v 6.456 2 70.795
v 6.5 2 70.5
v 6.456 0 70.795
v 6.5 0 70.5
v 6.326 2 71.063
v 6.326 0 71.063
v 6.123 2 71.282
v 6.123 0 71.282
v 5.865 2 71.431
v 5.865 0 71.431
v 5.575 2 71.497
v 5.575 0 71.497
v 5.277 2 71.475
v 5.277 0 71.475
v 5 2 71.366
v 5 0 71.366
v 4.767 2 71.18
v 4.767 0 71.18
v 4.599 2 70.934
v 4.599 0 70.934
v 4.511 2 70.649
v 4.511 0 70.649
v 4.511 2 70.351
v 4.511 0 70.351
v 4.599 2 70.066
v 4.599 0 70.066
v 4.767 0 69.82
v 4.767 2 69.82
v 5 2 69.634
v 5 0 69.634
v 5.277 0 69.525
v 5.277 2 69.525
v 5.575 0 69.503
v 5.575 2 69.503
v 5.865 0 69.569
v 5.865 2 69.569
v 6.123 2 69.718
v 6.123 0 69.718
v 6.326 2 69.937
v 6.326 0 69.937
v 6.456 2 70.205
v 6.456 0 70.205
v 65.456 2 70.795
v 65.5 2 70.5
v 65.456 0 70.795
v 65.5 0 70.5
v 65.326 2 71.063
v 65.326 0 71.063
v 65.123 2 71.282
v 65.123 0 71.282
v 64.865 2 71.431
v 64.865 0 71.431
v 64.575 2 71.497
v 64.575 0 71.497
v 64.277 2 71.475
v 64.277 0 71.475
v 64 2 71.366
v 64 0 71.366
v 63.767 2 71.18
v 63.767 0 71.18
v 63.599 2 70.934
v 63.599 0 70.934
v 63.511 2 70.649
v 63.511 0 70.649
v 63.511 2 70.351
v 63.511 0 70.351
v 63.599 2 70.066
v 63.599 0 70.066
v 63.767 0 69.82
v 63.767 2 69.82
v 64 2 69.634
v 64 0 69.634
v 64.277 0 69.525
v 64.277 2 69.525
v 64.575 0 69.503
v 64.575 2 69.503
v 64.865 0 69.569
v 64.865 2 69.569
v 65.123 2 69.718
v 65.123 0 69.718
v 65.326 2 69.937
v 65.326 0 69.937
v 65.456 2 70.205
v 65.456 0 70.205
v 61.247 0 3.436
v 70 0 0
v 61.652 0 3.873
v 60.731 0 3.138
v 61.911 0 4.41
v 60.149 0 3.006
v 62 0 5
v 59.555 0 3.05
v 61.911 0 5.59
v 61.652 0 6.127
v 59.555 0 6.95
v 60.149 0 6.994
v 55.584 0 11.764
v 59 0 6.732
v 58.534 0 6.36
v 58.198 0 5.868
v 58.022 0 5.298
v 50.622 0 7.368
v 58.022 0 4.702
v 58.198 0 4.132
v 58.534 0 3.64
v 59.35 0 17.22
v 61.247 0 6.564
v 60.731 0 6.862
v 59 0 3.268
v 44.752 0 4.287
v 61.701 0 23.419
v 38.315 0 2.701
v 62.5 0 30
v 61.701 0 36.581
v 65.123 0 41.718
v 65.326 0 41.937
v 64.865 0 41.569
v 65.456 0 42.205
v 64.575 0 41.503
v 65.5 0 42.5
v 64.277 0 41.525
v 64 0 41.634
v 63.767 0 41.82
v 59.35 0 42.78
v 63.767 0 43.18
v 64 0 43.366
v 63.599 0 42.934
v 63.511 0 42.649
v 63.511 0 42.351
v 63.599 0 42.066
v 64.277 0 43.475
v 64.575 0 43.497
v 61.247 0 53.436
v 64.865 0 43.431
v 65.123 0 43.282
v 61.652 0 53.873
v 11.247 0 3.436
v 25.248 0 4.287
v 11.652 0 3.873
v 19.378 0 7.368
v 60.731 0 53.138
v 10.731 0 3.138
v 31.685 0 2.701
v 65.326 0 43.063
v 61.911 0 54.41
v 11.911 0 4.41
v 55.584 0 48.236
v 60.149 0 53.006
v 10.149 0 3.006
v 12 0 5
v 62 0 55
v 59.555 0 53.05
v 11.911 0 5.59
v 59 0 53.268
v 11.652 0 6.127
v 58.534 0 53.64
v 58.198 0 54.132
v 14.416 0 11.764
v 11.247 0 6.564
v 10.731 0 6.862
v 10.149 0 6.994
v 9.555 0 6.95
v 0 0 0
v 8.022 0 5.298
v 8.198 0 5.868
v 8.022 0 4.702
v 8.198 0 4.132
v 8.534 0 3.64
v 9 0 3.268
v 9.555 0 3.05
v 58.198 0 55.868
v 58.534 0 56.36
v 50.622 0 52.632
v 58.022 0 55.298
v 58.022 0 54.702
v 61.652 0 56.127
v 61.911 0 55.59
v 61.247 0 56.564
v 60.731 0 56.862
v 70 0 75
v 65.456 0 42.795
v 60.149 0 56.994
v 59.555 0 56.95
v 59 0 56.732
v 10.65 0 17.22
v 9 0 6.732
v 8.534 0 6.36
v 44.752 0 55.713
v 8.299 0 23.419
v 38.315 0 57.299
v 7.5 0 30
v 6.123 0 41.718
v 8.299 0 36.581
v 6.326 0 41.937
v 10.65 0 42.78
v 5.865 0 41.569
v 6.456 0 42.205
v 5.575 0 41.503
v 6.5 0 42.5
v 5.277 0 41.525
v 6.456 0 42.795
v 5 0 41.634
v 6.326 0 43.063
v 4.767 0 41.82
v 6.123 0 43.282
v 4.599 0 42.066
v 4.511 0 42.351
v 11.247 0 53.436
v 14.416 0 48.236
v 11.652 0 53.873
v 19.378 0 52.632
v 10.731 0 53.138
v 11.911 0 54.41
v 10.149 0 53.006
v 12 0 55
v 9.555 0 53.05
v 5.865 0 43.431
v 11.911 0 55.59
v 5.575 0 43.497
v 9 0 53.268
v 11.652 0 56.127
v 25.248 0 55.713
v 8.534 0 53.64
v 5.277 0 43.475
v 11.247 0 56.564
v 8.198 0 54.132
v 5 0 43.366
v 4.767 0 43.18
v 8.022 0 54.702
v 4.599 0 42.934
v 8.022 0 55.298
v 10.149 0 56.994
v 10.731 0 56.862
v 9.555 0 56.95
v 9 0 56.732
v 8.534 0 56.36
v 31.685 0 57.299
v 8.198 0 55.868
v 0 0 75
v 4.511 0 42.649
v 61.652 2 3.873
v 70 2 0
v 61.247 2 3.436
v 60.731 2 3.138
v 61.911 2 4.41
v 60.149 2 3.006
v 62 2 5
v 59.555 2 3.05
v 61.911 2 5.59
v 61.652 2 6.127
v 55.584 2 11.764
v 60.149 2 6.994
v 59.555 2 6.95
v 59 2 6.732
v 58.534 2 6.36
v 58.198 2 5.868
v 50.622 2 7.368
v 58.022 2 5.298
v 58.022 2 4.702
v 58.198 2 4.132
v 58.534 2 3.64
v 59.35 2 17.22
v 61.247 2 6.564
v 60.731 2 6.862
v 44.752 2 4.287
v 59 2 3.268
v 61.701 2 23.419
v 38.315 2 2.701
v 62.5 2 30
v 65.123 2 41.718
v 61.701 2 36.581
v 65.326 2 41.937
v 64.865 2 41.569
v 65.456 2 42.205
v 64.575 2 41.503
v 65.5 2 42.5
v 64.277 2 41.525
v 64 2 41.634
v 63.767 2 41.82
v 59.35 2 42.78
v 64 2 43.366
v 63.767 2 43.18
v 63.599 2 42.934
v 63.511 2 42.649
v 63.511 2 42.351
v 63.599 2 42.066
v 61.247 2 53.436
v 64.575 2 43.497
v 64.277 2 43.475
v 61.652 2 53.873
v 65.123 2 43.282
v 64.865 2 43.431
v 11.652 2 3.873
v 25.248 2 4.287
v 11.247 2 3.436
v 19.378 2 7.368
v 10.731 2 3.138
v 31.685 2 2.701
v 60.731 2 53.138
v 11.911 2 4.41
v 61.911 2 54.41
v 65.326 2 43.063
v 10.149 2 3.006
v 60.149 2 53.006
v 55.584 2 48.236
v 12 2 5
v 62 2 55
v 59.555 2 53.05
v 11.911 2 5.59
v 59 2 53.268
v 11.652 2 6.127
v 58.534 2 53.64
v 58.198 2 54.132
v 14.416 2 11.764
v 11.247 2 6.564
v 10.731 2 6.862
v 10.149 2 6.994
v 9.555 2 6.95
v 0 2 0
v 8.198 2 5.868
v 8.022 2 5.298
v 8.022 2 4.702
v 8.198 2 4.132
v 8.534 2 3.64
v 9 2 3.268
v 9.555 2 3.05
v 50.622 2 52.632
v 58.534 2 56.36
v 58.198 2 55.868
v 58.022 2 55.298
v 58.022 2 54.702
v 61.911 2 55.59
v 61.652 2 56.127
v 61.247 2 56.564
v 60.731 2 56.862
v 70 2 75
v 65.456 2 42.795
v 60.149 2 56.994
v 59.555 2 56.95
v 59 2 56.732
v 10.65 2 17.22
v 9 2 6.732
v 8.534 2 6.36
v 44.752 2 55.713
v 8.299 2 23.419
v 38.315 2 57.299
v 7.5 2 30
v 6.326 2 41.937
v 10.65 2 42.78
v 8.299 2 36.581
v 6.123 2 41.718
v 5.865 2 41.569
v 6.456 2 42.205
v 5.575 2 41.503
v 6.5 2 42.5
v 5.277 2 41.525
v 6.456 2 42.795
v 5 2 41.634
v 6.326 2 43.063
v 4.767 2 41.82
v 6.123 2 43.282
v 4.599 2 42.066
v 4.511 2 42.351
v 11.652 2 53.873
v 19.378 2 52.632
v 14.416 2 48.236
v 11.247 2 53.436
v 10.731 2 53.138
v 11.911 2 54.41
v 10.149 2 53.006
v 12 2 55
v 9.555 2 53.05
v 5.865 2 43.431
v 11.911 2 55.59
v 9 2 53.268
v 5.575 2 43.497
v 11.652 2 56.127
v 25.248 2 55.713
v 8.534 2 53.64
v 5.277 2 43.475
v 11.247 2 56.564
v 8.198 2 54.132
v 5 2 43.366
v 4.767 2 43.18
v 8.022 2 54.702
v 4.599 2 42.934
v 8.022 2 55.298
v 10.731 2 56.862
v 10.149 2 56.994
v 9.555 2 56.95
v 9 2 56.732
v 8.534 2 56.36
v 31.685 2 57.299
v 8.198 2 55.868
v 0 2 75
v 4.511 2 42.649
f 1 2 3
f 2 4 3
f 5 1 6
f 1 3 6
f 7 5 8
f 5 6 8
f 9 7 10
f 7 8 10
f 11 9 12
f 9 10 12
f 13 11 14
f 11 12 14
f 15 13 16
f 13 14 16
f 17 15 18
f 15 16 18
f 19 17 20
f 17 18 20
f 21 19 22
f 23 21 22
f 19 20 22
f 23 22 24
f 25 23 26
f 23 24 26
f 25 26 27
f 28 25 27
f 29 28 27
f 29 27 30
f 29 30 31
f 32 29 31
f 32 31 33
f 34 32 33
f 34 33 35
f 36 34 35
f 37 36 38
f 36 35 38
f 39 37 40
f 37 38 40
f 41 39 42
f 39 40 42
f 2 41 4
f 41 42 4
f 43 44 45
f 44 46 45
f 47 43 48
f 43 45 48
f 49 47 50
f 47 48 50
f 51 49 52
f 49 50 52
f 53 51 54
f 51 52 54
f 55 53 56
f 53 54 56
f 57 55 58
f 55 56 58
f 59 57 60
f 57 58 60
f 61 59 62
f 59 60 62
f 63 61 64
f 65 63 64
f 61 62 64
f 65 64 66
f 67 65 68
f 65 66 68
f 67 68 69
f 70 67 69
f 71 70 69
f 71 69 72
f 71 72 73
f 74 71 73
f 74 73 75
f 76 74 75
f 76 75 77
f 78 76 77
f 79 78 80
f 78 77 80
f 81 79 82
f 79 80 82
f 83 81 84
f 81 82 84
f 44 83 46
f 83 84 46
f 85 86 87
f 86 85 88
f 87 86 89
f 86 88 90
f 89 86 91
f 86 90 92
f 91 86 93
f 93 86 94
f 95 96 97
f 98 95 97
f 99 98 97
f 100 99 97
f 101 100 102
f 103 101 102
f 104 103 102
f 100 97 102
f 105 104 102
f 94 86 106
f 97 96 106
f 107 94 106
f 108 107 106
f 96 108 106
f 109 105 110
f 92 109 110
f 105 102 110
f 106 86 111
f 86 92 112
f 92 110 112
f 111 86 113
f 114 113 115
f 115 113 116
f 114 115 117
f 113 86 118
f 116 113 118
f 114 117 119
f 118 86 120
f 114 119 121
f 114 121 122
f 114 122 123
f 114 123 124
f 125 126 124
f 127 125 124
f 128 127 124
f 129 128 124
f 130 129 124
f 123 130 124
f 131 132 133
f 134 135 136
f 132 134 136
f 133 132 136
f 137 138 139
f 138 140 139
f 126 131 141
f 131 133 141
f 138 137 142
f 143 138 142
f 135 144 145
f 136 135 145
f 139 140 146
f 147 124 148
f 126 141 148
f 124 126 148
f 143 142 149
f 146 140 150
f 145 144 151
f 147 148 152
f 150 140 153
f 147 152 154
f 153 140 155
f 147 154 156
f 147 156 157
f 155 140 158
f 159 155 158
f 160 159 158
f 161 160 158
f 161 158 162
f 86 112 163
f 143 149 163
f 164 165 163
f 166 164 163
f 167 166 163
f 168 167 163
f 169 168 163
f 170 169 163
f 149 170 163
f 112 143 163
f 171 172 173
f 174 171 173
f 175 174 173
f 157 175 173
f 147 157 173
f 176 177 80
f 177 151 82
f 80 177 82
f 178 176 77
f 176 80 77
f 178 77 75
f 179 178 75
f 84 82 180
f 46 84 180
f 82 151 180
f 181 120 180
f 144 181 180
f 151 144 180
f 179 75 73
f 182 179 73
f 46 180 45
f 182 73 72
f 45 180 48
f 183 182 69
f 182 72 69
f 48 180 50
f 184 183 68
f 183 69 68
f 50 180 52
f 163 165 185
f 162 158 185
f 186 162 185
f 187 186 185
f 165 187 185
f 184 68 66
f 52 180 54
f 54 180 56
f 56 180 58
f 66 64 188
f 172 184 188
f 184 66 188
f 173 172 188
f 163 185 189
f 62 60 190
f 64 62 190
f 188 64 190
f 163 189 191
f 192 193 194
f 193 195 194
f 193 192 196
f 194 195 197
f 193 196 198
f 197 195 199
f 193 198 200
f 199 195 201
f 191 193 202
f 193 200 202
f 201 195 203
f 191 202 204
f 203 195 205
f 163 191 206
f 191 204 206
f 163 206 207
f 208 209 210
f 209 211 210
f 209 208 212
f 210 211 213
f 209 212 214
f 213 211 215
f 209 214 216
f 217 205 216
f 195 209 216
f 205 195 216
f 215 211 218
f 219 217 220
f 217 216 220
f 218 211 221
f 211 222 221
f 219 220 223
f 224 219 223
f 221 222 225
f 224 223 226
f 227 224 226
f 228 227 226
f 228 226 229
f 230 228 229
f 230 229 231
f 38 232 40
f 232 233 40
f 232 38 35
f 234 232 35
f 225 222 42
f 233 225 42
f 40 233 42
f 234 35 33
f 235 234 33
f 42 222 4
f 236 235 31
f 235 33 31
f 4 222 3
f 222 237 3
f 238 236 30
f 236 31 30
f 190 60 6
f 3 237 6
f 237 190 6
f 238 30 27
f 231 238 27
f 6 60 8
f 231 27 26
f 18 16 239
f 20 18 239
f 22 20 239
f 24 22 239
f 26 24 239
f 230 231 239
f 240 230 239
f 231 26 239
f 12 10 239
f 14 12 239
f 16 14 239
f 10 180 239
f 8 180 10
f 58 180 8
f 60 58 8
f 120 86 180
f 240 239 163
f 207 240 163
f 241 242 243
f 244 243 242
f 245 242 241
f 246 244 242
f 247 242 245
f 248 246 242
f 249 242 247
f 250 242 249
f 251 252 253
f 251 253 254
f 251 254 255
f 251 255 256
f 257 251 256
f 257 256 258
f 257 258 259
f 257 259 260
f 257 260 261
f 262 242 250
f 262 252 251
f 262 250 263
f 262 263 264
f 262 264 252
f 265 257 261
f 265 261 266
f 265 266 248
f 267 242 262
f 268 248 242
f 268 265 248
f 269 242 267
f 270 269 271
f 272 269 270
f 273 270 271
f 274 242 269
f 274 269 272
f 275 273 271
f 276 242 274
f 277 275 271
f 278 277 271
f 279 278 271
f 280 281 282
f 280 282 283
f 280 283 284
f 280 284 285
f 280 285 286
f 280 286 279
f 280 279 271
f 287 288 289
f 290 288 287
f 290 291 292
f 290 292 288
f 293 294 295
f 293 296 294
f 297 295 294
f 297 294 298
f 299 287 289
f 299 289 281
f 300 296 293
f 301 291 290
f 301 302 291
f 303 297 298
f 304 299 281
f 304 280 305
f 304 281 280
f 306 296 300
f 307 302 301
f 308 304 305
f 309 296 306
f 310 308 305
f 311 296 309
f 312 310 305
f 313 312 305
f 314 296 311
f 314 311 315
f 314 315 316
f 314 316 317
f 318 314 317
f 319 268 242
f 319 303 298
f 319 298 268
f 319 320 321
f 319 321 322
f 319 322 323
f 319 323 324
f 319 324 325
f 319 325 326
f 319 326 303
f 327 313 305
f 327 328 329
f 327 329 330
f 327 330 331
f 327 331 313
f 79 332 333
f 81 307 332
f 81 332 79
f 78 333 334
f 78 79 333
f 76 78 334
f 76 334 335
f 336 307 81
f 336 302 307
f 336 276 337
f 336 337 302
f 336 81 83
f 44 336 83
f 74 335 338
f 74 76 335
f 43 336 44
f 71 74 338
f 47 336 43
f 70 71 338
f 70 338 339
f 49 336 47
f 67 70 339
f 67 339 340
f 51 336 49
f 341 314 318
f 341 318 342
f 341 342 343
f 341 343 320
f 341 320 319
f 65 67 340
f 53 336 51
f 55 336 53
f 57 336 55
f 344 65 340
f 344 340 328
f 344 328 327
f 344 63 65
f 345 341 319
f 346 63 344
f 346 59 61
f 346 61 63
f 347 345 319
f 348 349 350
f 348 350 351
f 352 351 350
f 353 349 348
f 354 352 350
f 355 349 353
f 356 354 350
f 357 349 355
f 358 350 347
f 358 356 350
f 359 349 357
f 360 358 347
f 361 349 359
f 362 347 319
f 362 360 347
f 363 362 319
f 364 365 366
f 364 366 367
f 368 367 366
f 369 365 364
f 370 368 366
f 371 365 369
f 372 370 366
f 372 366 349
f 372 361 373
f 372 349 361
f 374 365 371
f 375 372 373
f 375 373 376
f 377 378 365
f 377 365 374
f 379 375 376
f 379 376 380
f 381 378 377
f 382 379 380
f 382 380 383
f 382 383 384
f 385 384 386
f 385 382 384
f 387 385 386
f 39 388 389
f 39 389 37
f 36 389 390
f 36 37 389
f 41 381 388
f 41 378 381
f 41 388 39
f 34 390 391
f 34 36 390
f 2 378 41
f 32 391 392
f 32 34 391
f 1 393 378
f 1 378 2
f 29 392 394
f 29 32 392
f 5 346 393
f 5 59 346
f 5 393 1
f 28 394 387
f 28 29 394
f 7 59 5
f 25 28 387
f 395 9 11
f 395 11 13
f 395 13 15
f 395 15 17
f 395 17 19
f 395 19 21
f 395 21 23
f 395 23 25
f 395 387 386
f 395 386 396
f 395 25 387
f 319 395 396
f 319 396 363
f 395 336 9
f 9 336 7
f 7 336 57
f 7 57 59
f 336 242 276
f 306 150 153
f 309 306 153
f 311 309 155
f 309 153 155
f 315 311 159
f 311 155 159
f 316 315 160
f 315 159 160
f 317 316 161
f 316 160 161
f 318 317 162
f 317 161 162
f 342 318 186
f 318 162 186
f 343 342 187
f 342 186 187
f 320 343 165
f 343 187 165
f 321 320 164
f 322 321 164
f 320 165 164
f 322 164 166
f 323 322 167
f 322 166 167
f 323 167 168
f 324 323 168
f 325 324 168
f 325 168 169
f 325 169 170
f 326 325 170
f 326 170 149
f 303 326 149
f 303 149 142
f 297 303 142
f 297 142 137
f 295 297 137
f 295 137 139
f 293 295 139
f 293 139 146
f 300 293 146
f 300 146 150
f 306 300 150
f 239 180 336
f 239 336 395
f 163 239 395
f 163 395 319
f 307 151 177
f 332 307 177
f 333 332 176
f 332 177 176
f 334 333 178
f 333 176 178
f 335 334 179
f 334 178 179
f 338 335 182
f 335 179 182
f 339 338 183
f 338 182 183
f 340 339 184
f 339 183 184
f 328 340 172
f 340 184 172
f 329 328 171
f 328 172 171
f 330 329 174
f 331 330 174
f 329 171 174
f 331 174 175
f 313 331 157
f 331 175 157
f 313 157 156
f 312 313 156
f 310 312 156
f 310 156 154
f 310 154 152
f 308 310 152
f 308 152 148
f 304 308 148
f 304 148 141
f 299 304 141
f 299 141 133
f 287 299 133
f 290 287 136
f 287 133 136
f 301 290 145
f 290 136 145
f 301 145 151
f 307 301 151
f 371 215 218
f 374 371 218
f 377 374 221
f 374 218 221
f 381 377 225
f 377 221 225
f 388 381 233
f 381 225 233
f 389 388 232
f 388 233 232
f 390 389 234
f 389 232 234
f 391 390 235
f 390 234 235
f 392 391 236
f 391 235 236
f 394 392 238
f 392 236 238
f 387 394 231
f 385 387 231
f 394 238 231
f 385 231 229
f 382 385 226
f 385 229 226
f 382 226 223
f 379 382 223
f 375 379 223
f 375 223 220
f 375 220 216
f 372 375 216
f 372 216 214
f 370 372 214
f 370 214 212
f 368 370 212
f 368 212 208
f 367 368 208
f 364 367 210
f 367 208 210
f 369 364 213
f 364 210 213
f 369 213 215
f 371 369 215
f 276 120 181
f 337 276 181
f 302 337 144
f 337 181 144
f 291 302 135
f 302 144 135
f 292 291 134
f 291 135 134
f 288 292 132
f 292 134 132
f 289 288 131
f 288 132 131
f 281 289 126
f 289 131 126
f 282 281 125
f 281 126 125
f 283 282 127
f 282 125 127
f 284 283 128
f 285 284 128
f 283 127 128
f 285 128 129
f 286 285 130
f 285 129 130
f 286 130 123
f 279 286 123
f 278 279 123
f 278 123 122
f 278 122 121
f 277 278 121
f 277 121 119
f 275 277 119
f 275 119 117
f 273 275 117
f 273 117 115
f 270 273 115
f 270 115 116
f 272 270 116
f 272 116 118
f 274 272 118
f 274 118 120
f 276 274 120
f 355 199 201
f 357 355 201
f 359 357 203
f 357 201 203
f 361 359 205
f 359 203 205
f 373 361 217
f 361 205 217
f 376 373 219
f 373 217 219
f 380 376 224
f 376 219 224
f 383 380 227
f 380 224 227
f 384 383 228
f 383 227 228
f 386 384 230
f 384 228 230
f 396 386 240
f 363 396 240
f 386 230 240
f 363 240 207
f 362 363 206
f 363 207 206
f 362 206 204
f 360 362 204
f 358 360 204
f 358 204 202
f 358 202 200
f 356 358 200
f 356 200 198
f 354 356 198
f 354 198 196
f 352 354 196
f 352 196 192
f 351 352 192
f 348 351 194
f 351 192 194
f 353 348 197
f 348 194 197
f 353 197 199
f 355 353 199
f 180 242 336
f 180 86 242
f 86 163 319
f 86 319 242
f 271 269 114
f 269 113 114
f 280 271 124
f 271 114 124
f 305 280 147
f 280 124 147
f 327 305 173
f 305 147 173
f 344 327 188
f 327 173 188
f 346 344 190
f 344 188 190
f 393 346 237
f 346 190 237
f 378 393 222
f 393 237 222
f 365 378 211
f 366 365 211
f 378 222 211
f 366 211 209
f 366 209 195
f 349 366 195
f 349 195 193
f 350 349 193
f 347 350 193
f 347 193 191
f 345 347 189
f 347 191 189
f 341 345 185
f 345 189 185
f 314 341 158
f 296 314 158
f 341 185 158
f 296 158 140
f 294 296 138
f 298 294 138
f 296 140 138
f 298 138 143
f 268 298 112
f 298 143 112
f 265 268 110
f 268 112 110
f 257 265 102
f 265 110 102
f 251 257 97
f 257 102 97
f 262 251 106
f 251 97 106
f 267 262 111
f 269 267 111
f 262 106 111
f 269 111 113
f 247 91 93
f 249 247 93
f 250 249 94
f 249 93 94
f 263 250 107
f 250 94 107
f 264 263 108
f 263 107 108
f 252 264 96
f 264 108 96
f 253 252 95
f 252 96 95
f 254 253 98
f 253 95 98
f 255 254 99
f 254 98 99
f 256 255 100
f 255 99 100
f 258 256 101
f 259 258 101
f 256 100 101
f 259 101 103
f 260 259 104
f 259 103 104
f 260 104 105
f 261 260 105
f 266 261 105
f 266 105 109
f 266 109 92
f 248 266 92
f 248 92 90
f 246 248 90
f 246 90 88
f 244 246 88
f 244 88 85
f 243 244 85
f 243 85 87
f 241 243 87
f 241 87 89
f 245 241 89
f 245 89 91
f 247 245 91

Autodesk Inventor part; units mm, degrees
ref_plane "YZ Plane" through (0, 0, 0) normal (1, 0, 0) x (0, 1, 0)
ref_plane "XZ Plane" through (0, 0, 0) normal (0, 1, 0) x (-1, 0, 0)
ref_plane "XY Plane" through (0, 0, 0) normal (0, 0, 1) x (1, 0, 0)
sketch "Sketch1" plane through (0, 0, 0) normal (0, 1, 0) x (-1, 0, 0)
  line L0 (0, 0) -> (-70, 0)
  line L1 (-70, 0) -> (-70, 75)
  line L2 (-70, 75) -> (0, 75)
  line L3 (0, 75) -> (0, 0)
  dimension "d0" = 75
  dimension "d1" = 70
extrude "Extrusion1" add sketch "Sketch1" along normal blind 2
sketch "Sketch2" plane through (0, 0, 0) normal (0, -1, 0) x (1, 0, 0)
  line L0 (70, 0) -> (70, 75) projected
  line L1 (70, 75) -> (0, 75) projected
  circle A0 centre (60, 55) radius 2
  circle A1 centre (10, 55) radius 2
  circle A2 centre (60, 5) radius 2
  circle A3 centre (10, 5) radius 2
  line L2 (0, 0) -> (70, 0) projected
  line L3 (35, 75) -> (35, 0) construction
  line L4 (5, 0) -> (65, 0) construction
  line L5 (65, 0) -> (65, 60) construction
  line L6 (65, 60) -> (5, 60) construction
  line L7 (5, 60) -> (5, 0) construction
  line L8 (5, 0) -> (65, 60) construction
  line L9 (65, 0) -> (5, 60) construction
  circle A4 centre (35, 30) radius 27.5
  dimension "d7" = 4
  dimension "d44" = 50
  dimension "d47" = 50
  dimension "d56" = 55
  dimension "d71" = 60
  dimension "d72" = 60
  dimension "d73" = 30
  dimension "d74" = 5
  dimension "d75" = 55
extrude "Extrusion2" cut sketch "Sketch2" against normal through all
sketch "Sketch5" plane through (0, 0, 0) normal (0, -1, 0) x (1, 0, 0)
  line L0 (0, 0) -> (70, 0) projected
  line L1 (70, 0) -> (70, 75) projected
  line L2 (70, 75) -> (0, 75) projected
  circle A0 centre (64.5, 70.5) radius 1
  circle A1 centre (5.5, 70.5) radius 1
  circle A2 centre (64.5, 42.5) radius 1
  circle A3 centre (5.5, 42.5) radius 1
  line L3 (35, 75) -> (35, 0) construction
  dimension "d57" = 2
  dimension "d58" = 4.5
  dimension "d61" = 59
  dimension "d64" = 28
  dimension "d68" = 59
extrude "Extrusion5" cut sketch "Sketch5" against normal through all
properties part number "base_usb3"
